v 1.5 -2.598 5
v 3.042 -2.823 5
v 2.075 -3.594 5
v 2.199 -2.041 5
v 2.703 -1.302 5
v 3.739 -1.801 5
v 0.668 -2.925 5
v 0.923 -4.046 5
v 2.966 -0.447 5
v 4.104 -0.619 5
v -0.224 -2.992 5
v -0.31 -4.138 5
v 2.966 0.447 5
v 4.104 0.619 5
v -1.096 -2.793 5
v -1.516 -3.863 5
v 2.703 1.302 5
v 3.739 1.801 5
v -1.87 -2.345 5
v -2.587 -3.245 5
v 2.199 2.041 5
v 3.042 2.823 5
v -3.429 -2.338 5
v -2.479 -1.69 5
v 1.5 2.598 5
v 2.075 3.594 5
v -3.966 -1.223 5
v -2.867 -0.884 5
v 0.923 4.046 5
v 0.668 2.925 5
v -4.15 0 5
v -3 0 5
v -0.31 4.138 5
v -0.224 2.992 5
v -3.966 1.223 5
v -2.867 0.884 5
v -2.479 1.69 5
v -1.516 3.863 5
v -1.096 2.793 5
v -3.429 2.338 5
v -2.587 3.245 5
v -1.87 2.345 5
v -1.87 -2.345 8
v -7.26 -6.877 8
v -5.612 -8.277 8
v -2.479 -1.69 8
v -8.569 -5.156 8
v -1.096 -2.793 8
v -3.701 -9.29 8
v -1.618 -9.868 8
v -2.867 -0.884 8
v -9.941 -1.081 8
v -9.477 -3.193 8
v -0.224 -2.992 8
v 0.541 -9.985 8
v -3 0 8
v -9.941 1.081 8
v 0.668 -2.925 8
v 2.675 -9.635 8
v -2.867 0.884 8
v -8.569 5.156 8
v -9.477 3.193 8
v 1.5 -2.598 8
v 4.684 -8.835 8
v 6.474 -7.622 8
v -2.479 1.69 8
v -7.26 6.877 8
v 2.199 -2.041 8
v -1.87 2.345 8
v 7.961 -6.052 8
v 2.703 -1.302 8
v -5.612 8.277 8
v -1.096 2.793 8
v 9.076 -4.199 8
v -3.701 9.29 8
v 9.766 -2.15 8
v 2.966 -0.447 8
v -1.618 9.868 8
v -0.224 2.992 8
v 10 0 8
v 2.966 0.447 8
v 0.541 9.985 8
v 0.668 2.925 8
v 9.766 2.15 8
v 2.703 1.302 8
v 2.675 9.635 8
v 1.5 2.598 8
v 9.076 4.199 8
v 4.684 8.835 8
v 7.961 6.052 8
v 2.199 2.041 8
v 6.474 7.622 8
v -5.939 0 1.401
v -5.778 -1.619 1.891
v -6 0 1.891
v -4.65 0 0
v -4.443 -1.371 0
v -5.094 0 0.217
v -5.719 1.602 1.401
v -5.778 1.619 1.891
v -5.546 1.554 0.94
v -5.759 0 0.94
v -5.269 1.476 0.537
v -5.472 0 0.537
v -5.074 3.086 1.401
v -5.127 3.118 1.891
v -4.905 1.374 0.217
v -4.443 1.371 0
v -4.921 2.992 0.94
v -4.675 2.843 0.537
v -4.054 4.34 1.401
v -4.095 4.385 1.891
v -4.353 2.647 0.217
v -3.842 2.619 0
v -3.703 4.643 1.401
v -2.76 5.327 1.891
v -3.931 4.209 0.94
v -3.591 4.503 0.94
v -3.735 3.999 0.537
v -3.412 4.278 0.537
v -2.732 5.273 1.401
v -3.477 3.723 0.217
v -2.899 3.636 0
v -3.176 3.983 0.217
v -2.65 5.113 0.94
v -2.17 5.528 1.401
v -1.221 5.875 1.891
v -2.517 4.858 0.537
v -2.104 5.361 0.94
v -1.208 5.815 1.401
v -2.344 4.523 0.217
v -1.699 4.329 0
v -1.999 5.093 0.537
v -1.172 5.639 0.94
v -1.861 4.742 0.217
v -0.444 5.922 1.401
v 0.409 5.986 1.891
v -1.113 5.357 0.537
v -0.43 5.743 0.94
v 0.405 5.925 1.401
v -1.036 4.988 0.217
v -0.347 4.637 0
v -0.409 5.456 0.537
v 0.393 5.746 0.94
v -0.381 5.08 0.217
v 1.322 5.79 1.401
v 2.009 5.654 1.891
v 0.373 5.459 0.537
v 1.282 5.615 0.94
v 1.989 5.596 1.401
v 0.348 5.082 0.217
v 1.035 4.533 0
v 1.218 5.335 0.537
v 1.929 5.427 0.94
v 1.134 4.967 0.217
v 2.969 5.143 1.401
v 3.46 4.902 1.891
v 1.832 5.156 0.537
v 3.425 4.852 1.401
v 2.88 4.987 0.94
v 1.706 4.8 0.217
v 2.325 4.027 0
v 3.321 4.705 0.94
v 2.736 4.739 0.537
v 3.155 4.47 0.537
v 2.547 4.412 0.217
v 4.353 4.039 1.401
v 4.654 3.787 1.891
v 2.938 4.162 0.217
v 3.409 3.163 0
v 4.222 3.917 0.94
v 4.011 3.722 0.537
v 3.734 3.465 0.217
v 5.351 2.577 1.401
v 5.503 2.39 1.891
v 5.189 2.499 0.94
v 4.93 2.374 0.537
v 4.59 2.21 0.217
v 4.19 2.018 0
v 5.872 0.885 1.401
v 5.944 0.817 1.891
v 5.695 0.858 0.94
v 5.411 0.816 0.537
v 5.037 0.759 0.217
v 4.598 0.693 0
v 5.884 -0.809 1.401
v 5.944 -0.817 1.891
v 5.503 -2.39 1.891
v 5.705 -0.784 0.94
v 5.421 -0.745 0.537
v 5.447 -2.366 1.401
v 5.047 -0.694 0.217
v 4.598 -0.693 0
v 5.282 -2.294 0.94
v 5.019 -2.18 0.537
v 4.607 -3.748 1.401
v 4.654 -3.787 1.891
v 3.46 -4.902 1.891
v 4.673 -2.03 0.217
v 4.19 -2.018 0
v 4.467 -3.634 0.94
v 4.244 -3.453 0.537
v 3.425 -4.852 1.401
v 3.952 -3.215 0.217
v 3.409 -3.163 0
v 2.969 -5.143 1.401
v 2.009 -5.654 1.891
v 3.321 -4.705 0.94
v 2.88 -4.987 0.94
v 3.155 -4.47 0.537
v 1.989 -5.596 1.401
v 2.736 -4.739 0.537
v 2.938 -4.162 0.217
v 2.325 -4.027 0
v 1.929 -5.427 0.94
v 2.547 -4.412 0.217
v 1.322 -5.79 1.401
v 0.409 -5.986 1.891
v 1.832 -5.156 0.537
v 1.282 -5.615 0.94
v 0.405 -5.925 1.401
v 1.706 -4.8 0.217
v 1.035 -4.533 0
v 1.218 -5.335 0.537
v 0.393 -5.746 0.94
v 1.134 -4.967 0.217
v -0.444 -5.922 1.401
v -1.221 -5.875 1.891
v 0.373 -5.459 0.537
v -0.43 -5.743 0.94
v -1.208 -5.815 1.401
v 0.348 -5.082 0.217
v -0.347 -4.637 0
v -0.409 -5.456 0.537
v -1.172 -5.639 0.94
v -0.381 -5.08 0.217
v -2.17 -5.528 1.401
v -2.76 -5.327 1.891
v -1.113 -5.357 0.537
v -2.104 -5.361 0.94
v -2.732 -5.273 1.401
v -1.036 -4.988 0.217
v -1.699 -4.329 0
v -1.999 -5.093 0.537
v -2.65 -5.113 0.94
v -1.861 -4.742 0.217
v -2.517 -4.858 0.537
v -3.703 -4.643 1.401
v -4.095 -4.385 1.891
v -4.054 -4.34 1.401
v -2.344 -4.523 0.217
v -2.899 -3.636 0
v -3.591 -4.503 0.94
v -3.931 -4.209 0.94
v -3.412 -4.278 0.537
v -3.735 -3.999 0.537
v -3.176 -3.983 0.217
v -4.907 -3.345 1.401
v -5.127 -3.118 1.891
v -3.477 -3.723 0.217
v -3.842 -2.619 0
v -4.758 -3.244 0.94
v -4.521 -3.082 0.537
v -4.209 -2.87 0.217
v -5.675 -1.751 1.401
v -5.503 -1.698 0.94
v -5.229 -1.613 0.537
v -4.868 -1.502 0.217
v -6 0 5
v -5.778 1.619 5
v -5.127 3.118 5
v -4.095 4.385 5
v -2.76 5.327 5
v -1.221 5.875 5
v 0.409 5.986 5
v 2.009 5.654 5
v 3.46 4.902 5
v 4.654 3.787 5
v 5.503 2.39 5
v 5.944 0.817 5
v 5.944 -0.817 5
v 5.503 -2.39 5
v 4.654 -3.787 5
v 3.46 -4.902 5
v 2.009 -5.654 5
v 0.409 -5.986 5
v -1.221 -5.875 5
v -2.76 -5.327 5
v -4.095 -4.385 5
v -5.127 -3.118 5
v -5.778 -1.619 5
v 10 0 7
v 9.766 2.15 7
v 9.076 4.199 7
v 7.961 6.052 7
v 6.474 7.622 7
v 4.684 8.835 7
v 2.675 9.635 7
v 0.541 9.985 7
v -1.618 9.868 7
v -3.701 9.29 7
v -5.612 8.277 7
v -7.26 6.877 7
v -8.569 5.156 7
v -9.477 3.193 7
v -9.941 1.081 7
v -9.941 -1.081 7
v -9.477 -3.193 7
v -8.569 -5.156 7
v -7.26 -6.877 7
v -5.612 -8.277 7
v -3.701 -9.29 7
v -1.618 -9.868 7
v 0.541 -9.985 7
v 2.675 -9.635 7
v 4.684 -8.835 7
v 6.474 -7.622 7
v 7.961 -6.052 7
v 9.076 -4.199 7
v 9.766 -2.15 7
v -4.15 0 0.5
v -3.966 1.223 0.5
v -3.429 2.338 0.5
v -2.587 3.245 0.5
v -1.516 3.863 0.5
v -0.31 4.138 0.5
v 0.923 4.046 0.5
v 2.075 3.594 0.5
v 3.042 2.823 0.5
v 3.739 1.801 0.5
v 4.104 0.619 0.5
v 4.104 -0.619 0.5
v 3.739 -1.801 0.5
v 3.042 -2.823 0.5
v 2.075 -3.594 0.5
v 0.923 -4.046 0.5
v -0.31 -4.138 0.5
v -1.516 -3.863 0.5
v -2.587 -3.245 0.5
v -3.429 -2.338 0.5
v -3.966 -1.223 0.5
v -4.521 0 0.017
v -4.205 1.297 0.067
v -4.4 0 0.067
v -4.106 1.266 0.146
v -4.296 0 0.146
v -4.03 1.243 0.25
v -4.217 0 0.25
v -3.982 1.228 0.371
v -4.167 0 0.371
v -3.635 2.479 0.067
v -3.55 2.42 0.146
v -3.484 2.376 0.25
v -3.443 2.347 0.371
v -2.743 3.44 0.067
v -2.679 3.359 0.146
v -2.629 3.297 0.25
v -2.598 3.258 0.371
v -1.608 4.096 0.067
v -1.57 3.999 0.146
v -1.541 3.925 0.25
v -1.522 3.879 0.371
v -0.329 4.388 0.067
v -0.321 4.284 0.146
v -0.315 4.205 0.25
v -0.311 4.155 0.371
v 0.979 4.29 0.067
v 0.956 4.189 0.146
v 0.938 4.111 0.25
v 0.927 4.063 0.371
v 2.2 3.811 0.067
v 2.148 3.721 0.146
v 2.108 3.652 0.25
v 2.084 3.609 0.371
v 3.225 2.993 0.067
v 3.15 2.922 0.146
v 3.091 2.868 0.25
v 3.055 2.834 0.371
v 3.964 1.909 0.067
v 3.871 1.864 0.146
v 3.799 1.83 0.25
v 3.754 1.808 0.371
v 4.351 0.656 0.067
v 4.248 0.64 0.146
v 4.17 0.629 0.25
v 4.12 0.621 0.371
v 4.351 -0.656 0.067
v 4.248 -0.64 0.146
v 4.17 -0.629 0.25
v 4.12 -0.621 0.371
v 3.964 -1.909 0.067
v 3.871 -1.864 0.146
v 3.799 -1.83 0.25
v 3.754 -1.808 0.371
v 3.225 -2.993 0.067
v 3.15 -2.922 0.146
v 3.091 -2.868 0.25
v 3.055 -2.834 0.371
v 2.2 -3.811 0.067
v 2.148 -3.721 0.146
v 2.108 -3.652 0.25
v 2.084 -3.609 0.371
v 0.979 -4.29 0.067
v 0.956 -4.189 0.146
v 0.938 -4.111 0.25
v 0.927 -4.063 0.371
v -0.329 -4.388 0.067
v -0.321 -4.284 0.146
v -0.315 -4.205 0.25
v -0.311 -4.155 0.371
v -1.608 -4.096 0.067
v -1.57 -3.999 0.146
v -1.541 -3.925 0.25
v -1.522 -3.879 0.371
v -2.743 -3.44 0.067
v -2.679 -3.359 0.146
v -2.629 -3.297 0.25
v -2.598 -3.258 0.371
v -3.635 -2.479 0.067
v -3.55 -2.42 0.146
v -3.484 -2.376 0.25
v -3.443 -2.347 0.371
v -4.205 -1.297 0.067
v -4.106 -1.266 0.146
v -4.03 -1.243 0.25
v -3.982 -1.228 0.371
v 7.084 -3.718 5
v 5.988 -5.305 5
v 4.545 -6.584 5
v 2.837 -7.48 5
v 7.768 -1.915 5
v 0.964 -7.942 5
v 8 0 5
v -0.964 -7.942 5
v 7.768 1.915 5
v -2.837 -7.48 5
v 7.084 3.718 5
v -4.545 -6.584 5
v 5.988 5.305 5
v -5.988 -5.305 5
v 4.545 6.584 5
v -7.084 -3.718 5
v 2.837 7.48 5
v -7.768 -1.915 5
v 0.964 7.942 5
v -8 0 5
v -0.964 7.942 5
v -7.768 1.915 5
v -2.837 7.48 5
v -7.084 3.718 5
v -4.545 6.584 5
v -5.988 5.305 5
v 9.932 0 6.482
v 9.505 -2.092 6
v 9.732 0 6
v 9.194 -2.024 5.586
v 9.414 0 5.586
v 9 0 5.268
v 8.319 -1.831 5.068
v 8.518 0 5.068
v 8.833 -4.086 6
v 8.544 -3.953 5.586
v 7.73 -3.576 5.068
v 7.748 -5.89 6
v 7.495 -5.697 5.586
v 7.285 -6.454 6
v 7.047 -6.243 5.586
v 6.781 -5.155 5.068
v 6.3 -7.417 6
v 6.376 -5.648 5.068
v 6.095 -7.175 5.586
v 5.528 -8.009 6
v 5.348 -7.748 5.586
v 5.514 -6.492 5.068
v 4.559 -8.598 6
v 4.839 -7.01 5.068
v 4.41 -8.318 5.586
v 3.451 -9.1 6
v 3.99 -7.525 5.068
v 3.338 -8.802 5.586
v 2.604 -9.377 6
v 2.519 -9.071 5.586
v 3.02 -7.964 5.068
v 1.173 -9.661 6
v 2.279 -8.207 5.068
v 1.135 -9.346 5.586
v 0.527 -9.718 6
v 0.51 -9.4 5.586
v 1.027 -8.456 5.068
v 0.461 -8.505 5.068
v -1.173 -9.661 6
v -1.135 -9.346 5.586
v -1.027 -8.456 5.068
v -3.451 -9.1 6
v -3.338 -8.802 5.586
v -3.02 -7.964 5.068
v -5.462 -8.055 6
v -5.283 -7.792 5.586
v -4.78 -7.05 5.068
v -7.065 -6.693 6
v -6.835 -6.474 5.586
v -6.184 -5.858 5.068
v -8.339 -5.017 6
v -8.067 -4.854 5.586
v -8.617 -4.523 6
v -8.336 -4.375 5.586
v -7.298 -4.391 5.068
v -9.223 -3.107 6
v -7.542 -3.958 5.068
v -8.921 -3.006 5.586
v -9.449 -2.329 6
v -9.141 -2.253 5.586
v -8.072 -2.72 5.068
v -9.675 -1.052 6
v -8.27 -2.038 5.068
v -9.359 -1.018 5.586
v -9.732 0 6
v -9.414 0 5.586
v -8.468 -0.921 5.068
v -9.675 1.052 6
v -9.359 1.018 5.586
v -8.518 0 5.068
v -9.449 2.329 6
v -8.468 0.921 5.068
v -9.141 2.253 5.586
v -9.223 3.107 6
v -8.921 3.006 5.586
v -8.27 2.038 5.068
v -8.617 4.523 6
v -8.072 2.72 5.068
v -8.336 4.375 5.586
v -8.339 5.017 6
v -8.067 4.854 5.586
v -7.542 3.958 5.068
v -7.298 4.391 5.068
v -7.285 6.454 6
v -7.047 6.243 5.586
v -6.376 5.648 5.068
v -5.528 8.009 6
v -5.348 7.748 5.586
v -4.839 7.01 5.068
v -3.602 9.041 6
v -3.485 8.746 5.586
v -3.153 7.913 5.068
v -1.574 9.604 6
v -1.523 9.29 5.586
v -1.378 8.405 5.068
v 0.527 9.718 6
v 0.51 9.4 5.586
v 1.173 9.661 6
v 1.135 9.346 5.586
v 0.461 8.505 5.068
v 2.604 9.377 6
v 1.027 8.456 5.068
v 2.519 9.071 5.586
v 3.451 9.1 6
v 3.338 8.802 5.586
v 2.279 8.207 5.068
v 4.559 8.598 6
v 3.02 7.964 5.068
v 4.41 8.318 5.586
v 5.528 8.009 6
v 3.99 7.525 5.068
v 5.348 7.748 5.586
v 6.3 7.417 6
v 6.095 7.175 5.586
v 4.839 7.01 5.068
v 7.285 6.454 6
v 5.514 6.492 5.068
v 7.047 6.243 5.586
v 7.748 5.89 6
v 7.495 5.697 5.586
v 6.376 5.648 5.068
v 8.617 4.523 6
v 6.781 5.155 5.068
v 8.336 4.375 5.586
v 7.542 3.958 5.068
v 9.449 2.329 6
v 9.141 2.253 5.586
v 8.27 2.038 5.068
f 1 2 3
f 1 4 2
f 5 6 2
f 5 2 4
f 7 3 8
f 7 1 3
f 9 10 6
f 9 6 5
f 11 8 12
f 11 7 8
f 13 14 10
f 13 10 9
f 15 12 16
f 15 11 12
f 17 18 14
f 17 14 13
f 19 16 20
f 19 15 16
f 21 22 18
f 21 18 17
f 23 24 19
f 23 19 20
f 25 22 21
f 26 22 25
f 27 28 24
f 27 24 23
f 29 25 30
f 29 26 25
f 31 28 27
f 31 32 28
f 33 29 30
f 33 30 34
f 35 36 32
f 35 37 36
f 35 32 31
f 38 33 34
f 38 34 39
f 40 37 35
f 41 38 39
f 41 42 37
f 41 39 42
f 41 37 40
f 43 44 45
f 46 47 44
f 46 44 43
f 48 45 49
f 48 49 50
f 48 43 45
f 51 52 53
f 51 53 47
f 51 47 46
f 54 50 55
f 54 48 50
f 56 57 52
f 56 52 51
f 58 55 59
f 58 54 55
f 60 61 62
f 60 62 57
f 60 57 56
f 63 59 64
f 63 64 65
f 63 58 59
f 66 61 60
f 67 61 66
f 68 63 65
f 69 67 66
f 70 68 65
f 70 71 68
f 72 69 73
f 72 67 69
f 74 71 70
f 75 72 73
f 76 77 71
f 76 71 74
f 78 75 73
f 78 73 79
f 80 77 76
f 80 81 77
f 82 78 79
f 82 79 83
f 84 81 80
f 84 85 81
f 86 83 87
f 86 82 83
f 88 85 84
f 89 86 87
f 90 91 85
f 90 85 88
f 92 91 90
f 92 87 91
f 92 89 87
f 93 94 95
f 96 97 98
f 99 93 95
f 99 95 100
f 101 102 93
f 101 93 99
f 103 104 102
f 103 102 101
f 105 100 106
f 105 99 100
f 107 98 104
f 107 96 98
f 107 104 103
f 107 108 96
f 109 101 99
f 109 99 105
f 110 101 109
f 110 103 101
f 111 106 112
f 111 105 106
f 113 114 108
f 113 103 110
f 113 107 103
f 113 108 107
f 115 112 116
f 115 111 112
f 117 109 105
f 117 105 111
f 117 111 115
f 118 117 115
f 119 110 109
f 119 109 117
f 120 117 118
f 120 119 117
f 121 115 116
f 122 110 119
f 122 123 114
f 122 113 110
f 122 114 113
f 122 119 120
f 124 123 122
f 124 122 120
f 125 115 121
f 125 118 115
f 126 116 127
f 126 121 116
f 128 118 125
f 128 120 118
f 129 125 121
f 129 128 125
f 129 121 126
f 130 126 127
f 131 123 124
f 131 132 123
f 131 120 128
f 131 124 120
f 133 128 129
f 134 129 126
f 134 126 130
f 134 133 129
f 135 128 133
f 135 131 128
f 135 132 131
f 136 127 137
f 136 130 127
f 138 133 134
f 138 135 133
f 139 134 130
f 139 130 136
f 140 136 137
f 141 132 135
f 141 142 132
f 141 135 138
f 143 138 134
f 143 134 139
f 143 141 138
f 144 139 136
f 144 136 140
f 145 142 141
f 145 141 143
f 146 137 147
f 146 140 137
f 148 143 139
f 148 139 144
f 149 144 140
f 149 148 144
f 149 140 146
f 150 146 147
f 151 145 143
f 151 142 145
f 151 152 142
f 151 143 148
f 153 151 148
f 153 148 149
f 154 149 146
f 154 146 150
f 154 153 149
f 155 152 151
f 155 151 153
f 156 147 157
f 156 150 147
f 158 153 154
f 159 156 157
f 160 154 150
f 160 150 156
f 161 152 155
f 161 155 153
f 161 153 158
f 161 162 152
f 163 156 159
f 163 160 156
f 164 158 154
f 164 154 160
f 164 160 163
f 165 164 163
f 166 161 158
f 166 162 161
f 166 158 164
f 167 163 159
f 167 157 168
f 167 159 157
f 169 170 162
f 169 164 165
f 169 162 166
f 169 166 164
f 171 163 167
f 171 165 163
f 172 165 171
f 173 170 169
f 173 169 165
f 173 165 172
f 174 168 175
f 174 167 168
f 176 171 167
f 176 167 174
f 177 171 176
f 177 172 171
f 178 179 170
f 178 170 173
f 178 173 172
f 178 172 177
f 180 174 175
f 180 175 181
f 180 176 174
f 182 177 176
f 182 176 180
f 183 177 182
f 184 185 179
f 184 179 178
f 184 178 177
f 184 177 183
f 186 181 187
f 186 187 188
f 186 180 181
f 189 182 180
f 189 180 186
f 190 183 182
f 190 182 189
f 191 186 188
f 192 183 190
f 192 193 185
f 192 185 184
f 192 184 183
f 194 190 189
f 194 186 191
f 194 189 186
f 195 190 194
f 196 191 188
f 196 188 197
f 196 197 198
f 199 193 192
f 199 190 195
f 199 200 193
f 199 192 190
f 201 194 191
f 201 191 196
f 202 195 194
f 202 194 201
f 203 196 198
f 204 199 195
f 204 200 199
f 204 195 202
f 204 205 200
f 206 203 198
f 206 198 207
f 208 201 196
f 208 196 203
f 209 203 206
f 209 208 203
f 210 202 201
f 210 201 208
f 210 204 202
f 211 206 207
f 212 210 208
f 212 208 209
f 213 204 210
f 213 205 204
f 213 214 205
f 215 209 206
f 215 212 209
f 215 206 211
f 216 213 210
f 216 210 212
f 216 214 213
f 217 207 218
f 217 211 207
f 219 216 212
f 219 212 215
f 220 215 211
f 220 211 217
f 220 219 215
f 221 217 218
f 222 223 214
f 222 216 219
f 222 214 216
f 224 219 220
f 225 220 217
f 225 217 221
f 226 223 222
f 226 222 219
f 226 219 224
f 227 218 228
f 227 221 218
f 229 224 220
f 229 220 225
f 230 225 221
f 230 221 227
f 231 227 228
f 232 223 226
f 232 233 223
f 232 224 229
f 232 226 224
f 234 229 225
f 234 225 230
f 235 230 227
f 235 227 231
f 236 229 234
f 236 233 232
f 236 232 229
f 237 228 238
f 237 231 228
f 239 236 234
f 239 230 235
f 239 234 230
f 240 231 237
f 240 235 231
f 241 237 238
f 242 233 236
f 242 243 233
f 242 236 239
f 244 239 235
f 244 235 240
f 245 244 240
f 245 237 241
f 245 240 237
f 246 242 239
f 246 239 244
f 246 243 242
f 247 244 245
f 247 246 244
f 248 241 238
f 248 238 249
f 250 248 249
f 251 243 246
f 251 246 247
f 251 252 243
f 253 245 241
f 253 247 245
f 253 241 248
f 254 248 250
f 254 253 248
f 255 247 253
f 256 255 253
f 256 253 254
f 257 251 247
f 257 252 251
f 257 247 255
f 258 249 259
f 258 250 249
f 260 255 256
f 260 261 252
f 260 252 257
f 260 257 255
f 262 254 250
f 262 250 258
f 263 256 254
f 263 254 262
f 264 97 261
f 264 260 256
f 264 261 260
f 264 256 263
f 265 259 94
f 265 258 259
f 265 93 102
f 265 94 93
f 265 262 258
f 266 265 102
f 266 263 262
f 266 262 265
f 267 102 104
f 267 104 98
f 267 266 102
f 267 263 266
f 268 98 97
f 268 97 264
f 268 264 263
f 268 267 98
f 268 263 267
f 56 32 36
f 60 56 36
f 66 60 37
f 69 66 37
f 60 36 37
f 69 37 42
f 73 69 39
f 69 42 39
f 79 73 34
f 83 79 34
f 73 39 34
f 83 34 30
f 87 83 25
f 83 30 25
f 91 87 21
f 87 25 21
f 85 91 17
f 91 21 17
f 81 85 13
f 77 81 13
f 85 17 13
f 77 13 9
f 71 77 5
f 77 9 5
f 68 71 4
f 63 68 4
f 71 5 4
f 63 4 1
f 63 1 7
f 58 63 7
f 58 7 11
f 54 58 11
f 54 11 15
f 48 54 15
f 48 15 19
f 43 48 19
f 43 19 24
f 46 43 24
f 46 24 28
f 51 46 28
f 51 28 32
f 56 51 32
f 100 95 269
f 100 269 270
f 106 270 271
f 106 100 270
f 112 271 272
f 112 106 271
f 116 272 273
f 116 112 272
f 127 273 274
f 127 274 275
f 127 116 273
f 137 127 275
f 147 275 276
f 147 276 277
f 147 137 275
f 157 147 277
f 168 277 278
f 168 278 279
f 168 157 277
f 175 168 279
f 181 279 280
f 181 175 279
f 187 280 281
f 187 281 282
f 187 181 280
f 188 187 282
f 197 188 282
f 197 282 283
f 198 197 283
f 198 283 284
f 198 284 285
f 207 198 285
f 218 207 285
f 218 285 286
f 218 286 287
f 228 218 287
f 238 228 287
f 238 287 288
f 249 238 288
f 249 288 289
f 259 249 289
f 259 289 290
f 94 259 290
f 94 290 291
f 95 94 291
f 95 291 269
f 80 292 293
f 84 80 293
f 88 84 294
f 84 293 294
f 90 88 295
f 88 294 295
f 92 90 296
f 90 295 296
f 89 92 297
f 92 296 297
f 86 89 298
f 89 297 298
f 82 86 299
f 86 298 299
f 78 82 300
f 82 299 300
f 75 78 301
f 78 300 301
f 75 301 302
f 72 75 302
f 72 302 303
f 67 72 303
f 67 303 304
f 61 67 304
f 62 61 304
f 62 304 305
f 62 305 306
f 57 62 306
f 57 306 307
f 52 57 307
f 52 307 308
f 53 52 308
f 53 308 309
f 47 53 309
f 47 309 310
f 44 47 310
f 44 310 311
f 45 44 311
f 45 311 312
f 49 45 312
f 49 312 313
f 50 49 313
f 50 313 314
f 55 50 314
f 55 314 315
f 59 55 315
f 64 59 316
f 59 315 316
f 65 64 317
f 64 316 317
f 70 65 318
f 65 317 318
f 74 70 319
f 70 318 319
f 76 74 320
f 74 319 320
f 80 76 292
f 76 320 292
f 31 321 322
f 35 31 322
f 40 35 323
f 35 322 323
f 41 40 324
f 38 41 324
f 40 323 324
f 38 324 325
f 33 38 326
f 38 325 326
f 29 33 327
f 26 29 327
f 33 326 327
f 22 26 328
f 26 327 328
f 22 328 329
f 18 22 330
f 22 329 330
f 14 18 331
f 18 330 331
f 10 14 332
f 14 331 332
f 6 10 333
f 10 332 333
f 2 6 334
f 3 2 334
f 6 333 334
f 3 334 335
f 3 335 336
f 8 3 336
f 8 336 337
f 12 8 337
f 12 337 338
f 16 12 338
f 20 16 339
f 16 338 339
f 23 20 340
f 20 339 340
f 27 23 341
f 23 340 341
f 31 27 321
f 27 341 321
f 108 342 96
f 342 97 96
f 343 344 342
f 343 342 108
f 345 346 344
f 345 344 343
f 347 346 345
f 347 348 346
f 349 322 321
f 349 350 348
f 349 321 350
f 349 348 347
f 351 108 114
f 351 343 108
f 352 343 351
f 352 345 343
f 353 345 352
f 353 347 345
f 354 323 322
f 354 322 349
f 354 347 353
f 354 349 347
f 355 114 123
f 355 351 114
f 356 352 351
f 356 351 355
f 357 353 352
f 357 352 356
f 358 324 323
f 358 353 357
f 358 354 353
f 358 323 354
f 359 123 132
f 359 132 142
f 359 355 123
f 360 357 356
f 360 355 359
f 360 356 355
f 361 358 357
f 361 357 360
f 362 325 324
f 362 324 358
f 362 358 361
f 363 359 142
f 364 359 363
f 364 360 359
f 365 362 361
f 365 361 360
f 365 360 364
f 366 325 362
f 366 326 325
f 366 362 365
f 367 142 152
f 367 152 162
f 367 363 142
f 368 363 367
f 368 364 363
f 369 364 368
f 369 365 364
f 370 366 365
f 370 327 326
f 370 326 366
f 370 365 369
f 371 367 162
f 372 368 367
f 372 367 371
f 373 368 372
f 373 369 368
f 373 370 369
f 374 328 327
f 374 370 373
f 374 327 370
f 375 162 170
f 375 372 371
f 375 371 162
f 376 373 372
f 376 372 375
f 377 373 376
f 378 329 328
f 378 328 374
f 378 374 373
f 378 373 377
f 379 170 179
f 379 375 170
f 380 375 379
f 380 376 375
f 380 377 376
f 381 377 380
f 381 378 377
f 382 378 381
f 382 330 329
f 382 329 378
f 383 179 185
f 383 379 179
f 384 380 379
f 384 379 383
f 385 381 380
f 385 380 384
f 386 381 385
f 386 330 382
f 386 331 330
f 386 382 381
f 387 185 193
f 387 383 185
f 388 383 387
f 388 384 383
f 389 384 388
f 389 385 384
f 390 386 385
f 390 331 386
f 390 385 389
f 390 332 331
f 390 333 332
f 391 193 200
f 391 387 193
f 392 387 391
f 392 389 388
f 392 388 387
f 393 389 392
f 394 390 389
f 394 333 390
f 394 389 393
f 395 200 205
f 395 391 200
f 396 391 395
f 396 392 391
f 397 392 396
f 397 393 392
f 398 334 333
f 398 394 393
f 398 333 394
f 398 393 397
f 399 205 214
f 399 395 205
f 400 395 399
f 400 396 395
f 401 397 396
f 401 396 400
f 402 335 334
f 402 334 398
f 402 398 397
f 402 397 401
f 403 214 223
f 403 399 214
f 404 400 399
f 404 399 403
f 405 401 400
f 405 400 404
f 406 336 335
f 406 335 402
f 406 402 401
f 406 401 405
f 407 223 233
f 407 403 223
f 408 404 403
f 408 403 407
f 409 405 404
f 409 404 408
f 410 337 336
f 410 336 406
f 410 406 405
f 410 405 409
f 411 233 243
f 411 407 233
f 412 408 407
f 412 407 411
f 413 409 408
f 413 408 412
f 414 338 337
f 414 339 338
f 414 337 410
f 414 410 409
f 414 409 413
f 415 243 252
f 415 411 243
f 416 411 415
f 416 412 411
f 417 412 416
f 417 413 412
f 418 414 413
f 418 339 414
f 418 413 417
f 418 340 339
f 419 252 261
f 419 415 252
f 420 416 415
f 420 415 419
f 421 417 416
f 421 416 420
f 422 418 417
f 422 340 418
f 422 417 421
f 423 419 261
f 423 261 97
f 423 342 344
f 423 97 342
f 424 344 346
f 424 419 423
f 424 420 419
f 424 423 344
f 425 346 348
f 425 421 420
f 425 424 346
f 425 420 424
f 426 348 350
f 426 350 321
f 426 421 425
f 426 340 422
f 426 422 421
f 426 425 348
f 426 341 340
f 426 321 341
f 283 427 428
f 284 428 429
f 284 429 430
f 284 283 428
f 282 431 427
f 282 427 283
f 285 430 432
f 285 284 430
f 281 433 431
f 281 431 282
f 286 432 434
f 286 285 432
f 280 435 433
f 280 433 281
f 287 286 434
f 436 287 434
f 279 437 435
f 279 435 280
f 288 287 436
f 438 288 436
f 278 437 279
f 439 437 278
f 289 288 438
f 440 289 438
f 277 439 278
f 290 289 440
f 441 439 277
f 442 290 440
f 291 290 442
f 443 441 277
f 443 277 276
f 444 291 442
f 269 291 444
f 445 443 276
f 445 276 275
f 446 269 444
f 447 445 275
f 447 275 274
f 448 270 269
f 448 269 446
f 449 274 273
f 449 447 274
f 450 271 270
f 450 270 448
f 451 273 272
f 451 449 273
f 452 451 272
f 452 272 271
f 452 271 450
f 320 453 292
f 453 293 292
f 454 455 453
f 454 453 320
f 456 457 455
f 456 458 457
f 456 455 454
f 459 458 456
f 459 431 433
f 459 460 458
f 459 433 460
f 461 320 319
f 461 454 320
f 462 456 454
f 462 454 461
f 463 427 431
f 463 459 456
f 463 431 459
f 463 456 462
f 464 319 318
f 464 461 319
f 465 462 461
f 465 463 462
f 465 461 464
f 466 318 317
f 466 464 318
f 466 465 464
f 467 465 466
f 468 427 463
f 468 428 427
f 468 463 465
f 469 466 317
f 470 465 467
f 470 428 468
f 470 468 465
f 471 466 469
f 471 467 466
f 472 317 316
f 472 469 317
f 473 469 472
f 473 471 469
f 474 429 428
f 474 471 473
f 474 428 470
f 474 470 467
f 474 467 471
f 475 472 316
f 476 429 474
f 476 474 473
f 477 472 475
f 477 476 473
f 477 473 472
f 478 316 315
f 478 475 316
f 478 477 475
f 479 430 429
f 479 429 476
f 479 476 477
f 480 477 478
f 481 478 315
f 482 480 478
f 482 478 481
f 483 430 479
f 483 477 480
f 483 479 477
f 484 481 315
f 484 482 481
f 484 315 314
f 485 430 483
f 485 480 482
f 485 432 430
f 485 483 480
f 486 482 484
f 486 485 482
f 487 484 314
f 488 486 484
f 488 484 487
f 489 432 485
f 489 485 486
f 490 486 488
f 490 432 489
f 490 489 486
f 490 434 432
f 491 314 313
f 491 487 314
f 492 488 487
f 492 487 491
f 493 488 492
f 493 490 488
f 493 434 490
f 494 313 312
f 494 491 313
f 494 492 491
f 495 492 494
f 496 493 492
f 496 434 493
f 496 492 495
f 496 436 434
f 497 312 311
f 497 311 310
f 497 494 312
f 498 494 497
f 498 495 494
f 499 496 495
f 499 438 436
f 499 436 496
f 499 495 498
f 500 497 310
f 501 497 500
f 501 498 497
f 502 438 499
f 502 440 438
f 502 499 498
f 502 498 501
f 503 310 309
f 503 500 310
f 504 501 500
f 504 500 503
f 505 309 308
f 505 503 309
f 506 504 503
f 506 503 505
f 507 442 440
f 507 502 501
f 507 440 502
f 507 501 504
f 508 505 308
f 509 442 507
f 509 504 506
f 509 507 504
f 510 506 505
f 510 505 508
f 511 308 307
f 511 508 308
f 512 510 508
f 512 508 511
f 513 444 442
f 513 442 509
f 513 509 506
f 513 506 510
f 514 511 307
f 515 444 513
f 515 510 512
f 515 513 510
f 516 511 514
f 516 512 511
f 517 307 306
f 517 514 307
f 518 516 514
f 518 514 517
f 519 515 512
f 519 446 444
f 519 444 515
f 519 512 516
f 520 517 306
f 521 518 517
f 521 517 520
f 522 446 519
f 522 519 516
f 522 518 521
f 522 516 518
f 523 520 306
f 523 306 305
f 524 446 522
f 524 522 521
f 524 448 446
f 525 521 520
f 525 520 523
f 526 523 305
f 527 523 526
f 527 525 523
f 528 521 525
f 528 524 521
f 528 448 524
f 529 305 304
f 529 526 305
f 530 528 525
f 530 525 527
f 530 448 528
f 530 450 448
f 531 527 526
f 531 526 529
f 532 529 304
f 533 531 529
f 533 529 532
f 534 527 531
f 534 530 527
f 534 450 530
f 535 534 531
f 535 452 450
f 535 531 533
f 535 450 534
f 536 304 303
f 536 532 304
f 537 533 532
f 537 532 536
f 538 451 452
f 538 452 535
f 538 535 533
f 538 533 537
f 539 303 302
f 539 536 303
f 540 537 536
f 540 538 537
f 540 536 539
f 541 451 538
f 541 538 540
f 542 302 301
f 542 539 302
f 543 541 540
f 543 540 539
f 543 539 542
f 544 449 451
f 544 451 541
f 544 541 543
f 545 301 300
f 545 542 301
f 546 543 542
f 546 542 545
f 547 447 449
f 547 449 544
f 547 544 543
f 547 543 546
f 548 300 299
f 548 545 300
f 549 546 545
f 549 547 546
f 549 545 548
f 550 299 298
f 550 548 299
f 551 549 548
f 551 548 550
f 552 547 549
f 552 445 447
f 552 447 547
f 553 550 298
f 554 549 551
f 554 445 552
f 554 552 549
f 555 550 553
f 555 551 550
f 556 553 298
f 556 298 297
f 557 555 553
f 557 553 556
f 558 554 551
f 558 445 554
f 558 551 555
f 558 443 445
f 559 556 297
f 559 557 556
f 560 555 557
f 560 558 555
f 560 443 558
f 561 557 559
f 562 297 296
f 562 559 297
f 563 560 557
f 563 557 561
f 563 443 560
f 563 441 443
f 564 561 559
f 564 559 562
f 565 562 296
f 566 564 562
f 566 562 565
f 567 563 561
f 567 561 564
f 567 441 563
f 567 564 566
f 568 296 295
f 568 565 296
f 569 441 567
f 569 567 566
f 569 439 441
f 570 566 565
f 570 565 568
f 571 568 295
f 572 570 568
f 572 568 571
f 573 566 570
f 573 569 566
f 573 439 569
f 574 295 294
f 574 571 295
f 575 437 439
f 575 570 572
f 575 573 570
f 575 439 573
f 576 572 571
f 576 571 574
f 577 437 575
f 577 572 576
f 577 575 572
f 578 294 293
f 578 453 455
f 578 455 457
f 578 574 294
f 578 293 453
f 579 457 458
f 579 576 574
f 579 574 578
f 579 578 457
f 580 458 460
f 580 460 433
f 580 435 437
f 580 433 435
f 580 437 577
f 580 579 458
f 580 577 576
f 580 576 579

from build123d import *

# Parameters (mm, degrees)
SKETCH_1_R          = 10
EXTRUDE_1_DEPTH     = 8
SKETCH_2_R          = 4.15
CUT_EXTRUDE_1_DEPTH = 5
SKETCH_3_R          = 11.188676277
SKETCH_3_R_2        = 6
CUT_EXTRUDE_2_DEPTH = 5
FILLET_1_R          = 0.5
FILLET_2_R          = 2
SKETCH_4_R          = 3
CUT_EXTRUDE_3_DEPTH = 16


with BuildPart() as part:
    # 草图1 → 凸台-拉伸1 (new body)
    with BuildSketch(Plane.XY):
        Circle(SKETCH_1_R)
    extrude(amount=EXTRUDE_1_DEPTH)

    # 草图2 → 切除-拉伸1 (cut)
    with BuildSketch(Plane(origin=(0, 0, 0), x_dir=(-1, 0, 0), z_dir=(0, 0, -1))):
        Circle(SKETCH_2_R)
    extrude(amount=-CUT_EXTRUDE_1_DEPTH, mode=Mode.SUBTRACT)

    # 草图3 → 切除-拉伸2 (cut)
    with BuildSketch(Plane(origin=(0, 0, 0), x_dir=(-1, 0, 0), z_dir=(0, 0, -1))):
        Circle(SKETCH_3_R)
        Circle(SKETCH_3_R_2, mode=Mode.SUBTRACT)
    extrude(amount=-CUT_EXTRUDE_2_DEPTH, mode=Mode.SUBTRACT)

    # 圆角1
    fillet_1_edges = [part.edges().sort_by_distance(p)[0] for p in [
        (4.15, 0, 0),
    ]]
    fillet(fillet_1_edges, radius=FILLET_1_R)

    # 圆角2
    # the kernel refuses this fillet: 2 mm, written as the material it takes off along each edge
    with BuildSketch(Plane(origin=(0, 0, 5), x_dir=(1, 0, 0), z_dir=(0, 1, 0))) as fillet_2_piece_1:
        with BuildLine():
            CenterArc((10 - FILLET_2_R, -FILLET_2_R), FILLET_2_R, 0, 90)
            Line((10, -FILLET_2_R), (10, 0))
            Line((10, 0), (10 - FILLET_2_R, 0))
        make_face()
    revolve(axis=Axis((0, 0, 5), (0, 0, -1)), mode=Mode.SUBTRACT)
    with BuildSketch(Plane(origin=(0, 0, 0), x_dir=(-1, 0, 0), z_dir=(0, -1, 0))) as fillet_2_piece_2:
        with BuildLine():
            CenterArc((4, -1.891428032), FILLET_2_R, 0, 71.034425011)
            Line((6, -1.891428032), (6, 0))
            Line((6, 0), (4.65, 0))
        make_face()
    revolve(axis=Axis((0, 0, 0), (0, 0, -1)), mode=Mode.SUBTRACT)

    # 草图4 → 切除-拉伸3 (cut, through all)
    with BuildSketch(Plane(origin=(0, 0, 5), x_dir=(-1, 0, 0), z_dir=(0, 0, -1))):
        Circle(SKETCH_4_R)
    extrude(amount=-CUT_EXTRUDE_3_DEPTH, mode=Mode.SUBTRACT)


solid = part.part
